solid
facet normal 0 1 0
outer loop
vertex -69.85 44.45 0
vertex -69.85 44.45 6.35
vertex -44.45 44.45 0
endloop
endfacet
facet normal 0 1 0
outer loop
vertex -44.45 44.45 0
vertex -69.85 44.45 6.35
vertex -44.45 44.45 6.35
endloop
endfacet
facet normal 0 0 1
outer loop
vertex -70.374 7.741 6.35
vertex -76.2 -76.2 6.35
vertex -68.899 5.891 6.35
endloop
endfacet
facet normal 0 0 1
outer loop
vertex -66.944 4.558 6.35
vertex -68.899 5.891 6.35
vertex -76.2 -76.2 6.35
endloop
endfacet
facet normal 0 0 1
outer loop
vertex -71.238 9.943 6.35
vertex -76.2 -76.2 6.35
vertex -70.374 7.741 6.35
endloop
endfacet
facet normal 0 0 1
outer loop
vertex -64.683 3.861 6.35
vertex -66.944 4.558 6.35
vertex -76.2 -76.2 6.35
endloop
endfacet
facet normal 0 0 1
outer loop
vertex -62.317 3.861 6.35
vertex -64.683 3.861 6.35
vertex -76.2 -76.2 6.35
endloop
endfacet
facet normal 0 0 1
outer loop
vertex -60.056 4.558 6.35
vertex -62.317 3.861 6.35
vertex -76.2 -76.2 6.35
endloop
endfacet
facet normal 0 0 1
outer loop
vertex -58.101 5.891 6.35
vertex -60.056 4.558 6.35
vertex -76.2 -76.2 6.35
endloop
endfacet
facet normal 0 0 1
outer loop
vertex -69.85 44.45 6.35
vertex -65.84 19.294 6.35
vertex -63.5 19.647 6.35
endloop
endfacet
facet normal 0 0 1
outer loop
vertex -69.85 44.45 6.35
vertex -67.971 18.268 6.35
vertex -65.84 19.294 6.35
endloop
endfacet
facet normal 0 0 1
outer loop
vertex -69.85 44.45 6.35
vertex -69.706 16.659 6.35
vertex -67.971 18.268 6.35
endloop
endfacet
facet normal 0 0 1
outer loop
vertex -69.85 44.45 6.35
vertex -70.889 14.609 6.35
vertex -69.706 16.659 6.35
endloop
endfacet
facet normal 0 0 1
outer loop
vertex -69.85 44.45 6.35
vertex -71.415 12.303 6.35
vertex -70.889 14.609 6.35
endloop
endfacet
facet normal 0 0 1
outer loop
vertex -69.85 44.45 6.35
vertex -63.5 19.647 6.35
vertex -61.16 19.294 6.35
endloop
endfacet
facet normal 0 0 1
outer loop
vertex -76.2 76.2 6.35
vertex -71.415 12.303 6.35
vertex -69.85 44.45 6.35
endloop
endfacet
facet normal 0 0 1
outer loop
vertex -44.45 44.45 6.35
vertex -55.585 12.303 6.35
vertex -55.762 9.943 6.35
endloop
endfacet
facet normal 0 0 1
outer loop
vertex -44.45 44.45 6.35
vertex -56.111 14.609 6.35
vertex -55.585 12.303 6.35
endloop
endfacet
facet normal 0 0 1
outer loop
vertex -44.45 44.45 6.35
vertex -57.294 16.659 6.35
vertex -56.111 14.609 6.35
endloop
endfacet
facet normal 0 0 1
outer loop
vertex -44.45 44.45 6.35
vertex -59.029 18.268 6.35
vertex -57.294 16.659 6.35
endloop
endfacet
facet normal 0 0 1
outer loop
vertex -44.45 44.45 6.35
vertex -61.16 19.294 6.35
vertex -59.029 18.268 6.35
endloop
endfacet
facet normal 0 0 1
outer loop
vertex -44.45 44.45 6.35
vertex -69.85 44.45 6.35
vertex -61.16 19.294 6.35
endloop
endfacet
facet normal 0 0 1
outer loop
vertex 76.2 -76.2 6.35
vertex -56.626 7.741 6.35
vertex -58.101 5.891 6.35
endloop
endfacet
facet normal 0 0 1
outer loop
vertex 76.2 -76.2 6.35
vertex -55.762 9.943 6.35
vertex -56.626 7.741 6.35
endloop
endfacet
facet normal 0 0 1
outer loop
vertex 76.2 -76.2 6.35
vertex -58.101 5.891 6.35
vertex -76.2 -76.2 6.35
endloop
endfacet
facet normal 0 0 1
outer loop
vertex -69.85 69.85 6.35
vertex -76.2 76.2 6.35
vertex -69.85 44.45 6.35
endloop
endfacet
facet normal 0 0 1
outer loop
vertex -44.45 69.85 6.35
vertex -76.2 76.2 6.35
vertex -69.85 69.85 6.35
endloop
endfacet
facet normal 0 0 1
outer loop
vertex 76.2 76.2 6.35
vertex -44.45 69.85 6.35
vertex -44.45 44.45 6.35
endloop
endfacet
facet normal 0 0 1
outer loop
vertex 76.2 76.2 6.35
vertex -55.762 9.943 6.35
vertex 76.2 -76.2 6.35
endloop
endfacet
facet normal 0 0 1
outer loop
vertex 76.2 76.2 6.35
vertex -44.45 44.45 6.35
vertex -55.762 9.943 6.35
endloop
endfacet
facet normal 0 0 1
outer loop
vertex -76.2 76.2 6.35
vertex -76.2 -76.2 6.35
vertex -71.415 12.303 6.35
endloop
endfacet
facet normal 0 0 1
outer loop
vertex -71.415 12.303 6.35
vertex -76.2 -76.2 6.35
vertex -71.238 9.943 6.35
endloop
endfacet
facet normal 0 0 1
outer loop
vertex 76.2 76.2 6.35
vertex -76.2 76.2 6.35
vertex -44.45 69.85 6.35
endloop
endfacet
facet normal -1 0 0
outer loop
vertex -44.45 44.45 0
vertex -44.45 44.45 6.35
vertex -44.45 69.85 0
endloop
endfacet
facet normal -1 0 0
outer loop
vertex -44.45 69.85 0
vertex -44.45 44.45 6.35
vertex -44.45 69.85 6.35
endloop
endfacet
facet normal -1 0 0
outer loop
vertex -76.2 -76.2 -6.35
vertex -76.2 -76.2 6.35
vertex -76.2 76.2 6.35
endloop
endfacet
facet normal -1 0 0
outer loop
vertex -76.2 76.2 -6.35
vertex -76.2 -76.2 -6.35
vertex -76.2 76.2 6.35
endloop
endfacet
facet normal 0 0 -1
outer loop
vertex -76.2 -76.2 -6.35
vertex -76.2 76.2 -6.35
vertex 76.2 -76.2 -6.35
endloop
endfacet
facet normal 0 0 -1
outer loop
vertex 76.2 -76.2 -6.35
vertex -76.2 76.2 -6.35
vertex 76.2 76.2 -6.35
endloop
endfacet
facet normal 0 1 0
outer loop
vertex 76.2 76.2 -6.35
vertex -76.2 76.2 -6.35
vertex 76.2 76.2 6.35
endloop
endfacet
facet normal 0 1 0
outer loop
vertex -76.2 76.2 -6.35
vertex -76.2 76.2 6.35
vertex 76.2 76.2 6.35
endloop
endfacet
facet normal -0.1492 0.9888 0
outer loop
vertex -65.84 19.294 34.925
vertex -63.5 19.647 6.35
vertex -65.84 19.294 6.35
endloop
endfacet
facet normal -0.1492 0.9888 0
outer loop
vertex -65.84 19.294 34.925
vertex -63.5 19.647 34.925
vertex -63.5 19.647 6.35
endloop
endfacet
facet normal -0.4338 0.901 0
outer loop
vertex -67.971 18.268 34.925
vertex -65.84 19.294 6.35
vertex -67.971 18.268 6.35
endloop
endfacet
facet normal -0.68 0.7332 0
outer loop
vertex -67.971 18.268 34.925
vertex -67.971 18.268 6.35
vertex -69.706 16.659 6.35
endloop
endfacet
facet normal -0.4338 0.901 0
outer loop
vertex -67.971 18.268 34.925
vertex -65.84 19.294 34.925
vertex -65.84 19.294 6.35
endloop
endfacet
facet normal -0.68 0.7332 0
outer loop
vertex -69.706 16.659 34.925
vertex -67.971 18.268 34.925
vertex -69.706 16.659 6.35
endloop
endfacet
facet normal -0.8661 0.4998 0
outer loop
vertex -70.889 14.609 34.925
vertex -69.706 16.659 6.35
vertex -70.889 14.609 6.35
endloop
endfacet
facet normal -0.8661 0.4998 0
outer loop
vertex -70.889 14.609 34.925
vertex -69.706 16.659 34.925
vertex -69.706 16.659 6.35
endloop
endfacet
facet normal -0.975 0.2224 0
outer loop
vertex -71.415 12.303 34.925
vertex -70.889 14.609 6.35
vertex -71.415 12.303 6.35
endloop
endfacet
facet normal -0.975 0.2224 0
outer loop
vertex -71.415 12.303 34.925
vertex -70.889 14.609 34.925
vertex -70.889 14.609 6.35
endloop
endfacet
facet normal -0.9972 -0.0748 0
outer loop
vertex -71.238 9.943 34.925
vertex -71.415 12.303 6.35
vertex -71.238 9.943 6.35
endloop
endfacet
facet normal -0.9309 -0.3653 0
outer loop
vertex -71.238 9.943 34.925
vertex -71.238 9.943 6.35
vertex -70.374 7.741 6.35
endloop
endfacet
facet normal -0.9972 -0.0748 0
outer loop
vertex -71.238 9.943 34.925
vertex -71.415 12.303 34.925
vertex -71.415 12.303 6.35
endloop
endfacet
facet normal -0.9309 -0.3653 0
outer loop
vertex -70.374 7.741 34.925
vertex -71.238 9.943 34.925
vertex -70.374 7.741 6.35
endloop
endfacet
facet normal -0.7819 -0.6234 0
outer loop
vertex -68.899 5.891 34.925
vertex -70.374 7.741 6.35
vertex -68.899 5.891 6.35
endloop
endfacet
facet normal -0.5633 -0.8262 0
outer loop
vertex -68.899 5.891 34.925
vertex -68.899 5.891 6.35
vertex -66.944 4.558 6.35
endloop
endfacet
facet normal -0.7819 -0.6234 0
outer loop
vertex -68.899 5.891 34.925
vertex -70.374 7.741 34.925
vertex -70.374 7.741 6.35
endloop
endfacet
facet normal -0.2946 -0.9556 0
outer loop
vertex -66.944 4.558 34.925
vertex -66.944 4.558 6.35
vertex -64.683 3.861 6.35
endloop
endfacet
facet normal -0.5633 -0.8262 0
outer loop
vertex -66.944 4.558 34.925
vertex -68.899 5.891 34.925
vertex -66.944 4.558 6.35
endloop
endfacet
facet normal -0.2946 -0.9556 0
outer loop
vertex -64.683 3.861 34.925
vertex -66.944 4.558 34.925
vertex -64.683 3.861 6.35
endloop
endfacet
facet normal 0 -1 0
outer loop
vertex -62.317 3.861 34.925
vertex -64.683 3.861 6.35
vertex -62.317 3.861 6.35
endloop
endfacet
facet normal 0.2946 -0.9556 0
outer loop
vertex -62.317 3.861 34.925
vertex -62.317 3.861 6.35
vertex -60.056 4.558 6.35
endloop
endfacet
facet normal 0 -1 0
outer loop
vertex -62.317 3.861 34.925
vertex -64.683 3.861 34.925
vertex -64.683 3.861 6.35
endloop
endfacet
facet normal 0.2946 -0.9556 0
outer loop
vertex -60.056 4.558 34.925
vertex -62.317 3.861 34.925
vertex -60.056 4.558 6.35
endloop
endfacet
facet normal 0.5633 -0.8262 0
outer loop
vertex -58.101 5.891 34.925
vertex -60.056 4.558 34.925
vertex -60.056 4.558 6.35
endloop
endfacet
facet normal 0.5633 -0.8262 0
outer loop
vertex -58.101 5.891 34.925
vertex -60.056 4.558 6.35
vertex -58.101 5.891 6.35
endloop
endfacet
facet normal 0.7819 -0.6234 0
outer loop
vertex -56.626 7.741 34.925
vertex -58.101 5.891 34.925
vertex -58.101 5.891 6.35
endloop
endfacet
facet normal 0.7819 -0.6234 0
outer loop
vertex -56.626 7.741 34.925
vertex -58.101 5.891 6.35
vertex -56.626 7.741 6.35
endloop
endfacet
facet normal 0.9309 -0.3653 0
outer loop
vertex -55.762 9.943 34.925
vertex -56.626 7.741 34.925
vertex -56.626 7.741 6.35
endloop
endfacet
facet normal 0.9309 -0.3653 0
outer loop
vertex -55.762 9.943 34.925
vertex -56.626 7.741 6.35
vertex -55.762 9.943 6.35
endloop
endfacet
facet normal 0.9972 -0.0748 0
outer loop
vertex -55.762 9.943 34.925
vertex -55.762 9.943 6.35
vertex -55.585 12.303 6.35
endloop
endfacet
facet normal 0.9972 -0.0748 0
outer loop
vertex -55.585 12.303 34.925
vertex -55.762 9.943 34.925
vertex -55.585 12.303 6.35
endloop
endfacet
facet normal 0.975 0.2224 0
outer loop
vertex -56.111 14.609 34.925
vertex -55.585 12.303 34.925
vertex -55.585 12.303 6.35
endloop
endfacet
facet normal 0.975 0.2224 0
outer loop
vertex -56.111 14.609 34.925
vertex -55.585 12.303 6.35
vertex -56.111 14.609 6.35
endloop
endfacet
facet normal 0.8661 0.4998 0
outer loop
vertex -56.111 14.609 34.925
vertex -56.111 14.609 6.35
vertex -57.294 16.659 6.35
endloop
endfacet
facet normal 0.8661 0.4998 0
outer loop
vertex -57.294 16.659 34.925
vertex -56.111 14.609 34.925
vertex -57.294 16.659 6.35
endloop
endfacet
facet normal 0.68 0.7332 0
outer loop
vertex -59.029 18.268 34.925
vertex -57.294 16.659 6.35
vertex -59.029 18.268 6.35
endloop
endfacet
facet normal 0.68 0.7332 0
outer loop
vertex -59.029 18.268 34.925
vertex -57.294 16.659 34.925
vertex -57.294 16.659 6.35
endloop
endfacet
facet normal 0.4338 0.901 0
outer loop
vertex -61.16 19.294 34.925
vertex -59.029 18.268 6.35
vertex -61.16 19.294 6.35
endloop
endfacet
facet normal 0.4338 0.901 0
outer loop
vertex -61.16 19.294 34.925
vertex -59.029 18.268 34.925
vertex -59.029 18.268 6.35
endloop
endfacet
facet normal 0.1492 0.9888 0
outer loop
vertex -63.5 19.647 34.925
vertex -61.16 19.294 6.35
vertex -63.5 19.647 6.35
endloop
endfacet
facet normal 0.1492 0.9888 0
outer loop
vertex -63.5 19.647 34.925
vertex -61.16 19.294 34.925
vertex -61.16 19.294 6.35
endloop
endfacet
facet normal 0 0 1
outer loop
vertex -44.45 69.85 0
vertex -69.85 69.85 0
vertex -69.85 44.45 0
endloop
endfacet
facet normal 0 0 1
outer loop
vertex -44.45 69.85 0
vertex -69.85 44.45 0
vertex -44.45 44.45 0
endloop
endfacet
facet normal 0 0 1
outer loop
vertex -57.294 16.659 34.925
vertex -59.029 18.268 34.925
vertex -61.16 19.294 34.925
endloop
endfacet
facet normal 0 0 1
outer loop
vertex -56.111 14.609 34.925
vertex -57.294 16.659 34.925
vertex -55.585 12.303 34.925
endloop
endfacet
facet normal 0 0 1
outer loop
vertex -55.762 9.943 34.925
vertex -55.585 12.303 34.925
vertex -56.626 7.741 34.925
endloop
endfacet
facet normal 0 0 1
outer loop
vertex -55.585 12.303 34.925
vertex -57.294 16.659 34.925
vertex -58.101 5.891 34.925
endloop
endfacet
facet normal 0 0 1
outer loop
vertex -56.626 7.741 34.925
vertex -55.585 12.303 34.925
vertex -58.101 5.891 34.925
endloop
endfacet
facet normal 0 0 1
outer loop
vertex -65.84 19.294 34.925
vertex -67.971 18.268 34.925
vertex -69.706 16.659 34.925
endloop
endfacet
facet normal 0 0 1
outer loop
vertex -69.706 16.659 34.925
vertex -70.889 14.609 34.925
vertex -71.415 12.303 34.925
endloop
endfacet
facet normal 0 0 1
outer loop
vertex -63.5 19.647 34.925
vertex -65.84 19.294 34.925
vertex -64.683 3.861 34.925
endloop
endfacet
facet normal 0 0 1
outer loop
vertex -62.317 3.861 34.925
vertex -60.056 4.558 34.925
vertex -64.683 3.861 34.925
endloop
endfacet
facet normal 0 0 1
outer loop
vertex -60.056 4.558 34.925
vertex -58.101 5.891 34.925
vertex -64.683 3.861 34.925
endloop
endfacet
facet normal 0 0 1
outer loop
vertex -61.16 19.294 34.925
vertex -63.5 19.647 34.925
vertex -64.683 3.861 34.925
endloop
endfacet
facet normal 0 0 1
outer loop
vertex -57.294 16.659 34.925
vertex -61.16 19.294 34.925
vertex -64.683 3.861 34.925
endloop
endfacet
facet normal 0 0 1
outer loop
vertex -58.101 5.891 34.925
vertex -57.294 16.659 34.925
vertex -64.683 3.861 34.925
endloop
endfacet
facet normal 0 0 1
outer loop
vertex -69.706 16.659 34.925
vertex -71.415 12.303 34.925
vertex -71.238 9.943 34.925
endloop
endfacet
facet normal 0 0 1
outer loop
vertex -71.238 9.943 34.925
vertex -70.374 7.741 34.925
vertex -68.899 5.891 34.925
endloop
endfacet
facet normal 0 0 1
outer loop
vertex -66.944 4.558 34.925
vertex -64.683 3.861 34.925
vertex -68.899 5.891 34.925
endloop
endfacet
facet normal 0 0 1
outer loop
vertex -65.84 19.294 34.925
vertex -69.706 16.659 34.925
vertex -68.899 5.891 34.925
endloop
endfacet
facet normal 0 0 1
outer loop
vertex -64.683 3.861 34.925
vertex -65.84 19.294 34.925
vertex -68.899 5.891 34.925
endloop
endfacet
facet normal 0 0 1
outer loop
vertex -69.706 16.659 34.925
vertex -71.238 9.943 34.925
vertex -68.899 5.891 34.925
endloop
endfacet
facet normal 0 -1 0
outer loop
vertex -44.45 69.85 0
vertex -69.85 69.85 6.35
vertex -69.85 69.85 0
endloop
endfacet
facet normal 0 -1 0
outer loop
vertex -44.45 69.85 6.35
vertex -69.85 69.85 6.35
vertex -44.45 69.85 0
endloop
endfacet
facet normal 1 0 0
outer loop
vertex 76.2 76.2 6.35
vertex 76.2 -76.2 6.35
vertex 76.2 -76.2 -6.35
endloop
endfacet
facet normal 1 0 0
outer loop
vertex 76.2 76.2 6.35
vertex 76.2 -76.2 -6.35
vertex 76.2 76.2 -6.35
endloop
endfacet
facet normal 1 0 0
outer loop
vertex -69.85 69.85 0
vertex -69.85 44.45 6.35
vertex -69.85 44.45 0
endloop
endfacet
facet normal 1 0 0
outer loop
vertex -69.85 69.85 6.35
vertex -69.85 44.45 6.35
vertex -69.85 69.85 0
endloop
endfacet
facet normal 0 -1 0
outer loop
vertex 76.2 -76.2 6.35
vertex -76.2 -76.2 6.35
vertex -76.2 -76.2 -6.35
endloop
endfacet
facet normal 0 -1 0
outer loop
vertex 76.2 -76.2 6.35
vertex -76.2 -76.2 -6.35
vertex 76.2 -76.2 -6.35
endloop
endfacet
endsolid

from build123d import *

# Parameters (mm, degrees)
F0_W     = 152.4
F0_H     = 152.4
F1_DEPTH = 6.35
F2_W     = 25.4
F2_H     = 25.4
F3_DEPTH = 6.35
F5_W     = 7.9375
F5_H     = 28.575


with BuildPart() as f1:
    # F0 (on Top) → F1 (new body, symmetric)
    with BuildSketch(Plane.XY):
        Rectangle(F0_W, F0_H)
    extrude(amount=F1_DEPTH, both=True)

    # F2 (on face) → F3 (cut)
    with BuildSketch(Plane.XY.offset(6.35)):
        with Locations((-57.15, 57.15)):
            Rectangle(F2_W, F2_H)
    extrude(amount=-F3_DEPTH, mode=Mode.SUBTRACT)

    # F5 (on offset) → F6 (revolve)
    with BuildSketch(Plane.YZ.offset(-63.5)):
        with Locations((15.678355, 20.6375)):
            Rectangle(F5_W, F5_H)
    revolve(axis=Axis((-63.5, 11.709605, 20.6375), (0, 0, 1)))


solid = f1.part
